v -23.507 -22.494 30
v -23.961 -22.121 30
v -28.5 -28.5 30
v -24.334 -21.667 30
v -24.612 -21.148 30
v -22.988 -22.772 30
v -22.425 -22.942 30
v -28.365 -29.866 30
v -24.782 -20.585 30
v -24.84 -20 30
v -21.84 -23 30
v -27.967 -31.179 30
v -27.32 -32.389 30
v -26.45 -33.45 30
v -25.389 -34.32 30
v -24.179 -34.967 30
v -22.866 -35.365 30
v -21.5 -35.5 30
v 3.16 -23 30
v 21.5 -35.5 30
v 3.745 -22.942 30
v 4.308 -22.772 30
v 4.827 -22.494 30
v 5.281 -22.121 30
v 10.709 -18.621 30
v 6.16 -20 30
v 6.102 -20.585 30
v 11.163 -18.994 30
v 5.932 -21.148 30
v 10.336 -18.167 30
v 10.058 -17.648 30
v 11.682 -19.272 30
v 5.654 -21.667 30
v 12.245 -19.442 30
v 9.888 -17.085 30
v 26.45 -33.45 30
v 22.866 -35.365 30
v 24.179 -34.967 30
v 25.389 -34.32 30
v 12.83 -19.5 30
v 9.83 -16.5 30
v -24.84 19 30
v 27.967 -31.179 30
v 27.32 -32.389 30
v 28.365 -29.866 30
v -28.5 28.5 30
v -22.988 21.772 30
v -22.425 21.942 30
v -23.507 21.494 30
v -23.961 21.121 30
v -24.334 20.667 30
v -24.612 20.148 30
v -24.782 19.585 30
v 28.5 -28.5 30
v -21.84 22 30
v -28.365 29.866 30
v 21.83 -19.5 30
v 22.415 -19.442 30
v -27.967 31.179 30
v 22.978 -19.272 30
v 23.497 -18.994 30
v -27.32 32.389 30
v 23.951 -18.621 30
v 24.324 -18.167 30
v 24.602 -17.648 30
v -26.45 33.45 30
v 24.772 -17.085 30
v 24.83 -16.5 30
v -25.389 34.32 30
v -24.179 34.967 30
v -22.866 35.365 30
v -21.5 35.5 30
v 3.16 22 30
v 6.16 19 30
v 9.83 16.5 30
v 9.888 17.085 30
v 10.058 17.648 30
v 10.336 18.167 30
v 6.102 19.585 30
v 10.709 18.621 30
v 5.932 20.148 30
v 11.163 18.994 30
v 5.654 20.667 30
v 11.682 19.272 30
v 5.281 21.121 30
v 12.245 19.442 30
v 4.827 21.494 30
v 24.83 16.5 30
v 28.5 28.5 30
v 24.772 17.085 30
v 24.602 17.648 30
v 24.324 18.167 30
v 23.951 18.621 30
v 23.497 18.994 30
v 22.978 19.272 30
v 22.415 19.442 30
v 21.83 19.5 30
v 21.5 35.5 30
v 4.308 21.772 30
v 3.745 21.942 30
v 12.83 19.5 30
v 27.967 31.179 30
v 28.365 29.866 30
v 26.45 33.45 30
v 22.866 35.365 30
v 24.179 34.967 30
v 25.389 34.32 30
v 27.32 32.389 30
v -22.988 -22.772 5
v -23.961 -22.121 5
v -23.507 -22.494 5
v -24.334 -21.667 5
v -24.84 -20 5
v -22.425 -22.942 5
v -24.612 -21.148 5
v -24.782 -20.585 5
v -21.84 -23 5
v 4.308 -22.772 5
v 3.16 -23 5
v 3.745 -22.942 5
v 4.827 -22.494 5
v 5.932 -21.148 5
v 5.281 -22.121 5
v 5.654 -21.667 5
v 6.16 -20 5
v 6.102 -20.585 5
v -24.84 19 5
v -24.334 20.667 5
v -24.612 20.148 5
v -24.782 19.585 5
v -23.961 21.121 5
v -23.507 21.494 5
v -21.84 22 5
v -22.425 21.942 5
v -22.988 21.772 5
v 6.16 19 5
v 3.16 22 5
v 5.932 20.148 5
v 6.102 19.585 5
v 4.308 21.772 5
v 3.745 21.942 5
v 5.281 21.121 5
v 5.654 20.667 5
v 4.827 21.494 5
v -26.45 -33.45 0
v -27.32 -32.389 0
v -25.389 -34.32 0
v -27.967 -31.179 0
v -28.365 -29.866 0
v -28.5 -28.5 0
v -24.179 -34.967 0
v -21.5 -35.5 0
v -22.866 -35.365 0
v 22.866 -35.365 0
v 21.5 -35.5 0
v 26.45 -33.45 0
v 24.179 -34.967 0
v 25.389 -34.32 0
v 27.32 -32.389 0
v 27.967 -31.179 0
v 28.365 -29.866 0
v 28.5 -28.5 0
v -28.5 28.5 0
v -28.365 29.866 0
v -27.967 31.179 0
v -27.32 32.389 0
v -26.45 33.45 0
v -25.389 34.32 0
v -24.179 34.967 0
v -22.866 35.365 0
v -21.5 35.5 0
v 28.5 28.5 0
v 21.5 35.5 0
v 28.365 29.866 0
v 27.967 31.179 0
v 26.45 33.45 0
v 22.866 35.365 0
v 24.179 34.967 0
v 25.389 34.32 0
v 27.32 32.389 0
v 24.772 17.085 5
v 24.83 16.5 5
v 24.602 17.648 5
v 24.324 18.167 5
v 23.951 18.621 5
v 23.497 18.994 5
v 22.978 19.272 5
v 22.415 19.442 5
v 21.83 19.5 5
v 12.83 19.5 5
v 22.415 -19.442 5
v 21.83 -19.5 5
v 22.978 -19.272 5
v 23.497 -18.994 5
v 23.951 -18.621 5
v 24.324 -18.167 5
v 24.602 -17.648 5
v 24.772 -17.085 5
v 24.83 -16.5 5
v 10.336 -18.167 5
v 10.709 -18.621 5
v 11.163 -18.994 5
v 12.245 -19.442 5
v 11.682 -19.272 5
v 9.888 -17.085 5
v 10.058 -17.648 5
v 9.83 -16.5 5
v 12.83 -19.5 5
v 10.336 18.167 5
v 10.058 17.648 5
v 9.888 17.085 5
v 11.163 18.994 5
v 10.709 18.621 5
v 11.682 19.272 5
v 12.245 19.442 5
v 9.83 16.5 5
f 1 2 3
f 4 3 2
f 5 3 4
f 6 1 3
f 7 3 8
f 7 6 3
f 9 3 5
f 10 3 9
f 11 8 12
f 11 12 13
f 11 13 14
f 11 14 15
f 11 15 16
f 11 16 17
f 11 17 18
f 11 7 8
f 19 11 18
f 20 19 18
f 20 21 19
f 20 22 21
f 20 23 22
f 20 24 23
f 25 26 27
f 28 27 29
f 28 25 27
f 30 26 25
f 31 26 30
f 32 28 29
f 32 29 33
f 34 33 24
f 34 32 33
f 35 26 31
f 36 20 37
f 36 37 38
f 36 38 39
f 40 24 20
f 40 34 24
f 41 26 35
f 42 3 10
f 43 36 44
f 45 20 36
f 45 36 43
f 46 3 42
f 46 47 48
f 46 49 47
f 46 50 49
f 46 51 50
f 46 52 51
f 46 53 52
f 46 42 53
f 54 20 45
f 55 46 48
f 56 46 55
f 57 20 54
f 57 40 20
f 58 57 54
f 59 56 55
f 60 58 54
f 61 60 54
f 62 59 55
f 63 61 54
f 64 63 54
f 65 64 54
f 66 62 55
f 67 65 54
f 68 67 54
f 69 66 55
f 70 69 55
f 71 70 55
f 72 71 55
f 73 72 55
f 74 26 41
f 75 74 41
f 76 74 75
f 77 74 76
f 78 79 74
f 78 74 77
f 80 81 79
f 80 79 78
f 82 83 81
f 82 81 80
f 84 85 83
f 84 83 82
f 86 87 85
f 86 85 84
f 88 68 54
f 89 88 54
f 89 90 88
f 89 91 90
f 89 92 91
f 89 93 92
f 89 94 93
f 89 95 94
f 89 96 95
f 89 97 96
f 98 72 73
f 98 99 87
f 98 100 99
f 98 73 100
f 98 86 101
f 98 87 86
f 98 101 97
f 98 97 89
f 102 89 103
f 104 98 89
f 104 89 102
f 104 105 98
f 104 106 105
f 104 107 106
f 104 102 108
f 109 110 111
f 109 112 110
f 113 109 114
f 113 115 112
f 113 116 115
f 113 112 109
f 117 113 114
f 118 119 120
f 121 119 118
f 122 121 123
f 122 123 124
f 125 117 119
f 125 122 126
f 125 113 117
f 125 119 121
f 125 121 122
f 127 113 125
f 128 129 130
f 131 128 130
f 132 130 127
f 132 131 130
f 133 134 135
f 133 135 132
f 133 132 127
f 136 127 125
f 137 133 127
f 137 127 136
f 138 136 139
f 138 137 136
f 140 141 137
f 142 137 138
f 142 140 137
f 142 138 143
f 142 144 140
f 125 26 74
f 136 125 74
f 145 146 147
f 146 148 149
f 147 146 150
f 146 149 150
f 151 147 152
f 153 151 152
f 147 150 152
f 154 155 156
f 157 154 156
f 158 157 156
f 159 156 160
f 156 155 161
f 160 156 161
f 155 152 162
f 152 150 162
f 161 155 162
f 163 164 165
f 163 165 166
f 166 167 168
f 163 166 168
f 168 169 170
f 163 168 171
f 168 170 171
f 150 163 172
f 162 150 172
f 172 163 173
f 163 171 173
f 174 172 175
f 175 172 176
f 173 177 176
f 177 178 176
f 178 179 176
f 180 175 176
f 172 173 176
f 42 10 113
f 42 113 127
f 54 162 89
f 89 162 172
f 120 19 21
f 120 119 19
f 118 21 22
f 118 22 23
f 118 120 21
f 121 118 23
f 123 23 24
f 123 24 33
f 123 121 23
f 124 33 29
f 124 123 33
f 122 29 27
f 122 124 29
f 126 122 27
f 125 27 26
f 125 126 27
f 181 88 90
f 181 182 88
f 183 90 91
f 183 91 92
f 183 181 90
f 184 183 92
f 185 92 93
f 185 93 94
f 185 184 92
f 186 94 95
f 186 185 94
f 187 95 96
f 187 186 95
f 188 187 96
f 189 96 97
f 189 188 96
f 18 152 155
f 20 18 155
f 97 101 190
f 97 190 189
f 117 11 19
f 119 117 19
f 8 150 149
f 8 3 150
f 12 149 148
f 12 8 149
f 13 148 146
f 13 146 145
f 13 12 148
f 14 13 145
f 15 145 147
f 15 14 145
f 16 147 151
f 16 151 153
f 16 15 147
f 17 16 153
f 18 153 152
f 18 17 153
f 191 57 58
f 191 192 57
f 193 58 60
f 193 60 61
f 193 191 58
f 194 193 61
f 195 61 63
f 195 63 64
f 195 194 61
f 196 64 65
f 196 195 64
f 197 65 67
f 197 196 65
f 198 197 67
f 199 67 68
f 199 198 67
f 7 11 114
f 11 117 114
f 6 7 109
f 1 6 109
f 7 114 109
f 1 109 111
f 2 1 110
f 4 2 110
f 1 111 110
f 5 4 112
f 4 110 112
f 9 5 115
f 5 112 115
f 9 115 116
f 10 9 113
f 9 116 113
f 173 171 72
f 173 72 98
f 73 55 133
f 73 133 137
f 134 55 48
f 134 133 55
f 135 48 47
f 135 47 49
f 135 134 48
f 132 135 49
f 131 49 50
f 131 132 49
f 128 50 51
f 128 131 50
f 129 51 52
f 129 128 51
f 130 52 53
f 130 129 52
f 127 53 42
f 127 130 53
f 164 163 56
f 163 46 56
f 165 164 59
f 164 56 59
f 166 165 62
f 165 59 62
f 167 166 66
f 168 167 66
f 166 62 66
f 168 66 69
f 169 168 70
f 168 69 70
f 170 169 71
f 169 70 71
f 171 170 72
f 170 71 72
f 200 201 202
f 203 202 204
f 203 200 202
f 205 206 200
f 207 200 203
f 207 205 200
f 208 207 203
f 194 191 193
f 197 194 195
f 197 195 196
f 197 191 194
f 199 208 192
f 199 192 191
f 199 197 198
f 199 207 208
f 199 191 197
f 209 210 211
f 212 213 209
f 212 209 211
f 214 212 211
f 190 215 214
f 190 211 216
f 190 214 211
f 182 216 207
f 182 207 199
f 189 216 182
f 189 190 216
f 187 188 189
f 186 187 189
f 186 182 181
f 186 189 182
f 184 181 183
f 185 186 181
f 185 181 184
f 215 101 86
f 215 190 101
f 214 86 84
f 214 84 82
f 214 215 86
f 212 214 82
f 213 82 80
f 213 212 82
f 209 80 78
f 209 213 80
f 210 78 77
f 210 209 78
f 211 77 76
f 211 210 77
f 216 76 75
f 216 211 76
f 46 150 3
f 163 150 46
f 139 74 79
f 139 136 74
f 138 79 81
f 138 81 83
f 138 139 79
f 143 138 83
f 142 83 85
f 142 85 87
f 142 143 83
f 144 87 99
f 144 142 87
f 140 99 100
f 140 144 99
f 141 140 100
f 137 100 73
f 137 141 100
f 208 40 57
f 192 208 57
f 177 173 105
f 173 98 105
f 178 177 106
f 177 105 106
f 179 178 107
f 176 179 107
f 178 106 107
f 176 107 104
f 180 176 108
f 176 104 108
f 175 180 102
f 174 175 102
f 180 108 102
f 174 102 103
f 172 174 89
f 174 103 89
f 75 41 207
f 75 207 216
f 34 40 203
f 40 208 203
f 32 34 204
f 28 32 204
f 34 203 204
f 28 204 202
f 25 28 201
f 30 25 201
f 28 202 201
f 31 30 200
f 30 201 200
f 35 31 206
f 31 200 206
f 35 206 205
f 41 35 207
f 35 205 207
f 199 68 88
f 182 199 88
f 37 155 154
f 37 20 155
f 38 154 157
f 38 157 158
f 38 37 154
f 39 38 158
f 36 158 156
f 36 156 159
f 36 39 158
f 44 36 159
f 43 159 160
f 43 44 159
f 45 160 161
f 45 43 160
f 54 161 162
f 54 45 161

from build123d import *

# Parameters (mm, degrees)
F0_W     = 57
F0_H     = 71
F1_DEPTH = 30
F2_W     = 31
F2_H     = 45
F2_W_2   = 15
F2_H_2   = 39
F3_DEPTH = 25
F4_R     = 7
F5_R     = 3


with BuildPart() as f1:
    # F0 (on Top) → F1 (new body)
    with BuildSketch(Plane.XY):
        Rectangle(F0_W, F0_H)
    extrude(amount=F1_DEPTH)

    # F2 (on face) → F3 (cut)
    with BuildSketch(Plane.XY.offset(30)):
        with Locations((-9.34, -0.5)):
            Rectangle(F2_W, F2_H)
        with Locations((17.33, 0)):
            Rectangle(F2_W_2, F2_H_2)
    extrude(amount=-F3_DEPTH, mode=Mode.SUBTRACT)

    # F4
    f4_edges = [f1.edges().sort_by_distance(p)[0] for p in [
        (28.5, 35.5, 15),
        (28.5, -35.5, 15),
        (-28.5, -35.5, 15),
        (-28.5, 35.5, 15),
    ]]
    fillet(f4_edges, radius=F4_R)

    # F5
    f5_edges = [f1.edges().sort_by_distance(p)[0] for p in [
        (24.83, 19.5, 17.5),
        (24.83, -19.5, 17.5),
        (6.16, -23, 17.5),
        (6.16, 22, 17.5),
        (-24.84, 22, 17.5),
        (9.83, 19.5, 17.5),
        (-24.84, -23, 17.5),
        (9.83, -19.5, 17.5),
    ]]
    fillet(f5_edges, radius=F5_R)


solid = f1.part
